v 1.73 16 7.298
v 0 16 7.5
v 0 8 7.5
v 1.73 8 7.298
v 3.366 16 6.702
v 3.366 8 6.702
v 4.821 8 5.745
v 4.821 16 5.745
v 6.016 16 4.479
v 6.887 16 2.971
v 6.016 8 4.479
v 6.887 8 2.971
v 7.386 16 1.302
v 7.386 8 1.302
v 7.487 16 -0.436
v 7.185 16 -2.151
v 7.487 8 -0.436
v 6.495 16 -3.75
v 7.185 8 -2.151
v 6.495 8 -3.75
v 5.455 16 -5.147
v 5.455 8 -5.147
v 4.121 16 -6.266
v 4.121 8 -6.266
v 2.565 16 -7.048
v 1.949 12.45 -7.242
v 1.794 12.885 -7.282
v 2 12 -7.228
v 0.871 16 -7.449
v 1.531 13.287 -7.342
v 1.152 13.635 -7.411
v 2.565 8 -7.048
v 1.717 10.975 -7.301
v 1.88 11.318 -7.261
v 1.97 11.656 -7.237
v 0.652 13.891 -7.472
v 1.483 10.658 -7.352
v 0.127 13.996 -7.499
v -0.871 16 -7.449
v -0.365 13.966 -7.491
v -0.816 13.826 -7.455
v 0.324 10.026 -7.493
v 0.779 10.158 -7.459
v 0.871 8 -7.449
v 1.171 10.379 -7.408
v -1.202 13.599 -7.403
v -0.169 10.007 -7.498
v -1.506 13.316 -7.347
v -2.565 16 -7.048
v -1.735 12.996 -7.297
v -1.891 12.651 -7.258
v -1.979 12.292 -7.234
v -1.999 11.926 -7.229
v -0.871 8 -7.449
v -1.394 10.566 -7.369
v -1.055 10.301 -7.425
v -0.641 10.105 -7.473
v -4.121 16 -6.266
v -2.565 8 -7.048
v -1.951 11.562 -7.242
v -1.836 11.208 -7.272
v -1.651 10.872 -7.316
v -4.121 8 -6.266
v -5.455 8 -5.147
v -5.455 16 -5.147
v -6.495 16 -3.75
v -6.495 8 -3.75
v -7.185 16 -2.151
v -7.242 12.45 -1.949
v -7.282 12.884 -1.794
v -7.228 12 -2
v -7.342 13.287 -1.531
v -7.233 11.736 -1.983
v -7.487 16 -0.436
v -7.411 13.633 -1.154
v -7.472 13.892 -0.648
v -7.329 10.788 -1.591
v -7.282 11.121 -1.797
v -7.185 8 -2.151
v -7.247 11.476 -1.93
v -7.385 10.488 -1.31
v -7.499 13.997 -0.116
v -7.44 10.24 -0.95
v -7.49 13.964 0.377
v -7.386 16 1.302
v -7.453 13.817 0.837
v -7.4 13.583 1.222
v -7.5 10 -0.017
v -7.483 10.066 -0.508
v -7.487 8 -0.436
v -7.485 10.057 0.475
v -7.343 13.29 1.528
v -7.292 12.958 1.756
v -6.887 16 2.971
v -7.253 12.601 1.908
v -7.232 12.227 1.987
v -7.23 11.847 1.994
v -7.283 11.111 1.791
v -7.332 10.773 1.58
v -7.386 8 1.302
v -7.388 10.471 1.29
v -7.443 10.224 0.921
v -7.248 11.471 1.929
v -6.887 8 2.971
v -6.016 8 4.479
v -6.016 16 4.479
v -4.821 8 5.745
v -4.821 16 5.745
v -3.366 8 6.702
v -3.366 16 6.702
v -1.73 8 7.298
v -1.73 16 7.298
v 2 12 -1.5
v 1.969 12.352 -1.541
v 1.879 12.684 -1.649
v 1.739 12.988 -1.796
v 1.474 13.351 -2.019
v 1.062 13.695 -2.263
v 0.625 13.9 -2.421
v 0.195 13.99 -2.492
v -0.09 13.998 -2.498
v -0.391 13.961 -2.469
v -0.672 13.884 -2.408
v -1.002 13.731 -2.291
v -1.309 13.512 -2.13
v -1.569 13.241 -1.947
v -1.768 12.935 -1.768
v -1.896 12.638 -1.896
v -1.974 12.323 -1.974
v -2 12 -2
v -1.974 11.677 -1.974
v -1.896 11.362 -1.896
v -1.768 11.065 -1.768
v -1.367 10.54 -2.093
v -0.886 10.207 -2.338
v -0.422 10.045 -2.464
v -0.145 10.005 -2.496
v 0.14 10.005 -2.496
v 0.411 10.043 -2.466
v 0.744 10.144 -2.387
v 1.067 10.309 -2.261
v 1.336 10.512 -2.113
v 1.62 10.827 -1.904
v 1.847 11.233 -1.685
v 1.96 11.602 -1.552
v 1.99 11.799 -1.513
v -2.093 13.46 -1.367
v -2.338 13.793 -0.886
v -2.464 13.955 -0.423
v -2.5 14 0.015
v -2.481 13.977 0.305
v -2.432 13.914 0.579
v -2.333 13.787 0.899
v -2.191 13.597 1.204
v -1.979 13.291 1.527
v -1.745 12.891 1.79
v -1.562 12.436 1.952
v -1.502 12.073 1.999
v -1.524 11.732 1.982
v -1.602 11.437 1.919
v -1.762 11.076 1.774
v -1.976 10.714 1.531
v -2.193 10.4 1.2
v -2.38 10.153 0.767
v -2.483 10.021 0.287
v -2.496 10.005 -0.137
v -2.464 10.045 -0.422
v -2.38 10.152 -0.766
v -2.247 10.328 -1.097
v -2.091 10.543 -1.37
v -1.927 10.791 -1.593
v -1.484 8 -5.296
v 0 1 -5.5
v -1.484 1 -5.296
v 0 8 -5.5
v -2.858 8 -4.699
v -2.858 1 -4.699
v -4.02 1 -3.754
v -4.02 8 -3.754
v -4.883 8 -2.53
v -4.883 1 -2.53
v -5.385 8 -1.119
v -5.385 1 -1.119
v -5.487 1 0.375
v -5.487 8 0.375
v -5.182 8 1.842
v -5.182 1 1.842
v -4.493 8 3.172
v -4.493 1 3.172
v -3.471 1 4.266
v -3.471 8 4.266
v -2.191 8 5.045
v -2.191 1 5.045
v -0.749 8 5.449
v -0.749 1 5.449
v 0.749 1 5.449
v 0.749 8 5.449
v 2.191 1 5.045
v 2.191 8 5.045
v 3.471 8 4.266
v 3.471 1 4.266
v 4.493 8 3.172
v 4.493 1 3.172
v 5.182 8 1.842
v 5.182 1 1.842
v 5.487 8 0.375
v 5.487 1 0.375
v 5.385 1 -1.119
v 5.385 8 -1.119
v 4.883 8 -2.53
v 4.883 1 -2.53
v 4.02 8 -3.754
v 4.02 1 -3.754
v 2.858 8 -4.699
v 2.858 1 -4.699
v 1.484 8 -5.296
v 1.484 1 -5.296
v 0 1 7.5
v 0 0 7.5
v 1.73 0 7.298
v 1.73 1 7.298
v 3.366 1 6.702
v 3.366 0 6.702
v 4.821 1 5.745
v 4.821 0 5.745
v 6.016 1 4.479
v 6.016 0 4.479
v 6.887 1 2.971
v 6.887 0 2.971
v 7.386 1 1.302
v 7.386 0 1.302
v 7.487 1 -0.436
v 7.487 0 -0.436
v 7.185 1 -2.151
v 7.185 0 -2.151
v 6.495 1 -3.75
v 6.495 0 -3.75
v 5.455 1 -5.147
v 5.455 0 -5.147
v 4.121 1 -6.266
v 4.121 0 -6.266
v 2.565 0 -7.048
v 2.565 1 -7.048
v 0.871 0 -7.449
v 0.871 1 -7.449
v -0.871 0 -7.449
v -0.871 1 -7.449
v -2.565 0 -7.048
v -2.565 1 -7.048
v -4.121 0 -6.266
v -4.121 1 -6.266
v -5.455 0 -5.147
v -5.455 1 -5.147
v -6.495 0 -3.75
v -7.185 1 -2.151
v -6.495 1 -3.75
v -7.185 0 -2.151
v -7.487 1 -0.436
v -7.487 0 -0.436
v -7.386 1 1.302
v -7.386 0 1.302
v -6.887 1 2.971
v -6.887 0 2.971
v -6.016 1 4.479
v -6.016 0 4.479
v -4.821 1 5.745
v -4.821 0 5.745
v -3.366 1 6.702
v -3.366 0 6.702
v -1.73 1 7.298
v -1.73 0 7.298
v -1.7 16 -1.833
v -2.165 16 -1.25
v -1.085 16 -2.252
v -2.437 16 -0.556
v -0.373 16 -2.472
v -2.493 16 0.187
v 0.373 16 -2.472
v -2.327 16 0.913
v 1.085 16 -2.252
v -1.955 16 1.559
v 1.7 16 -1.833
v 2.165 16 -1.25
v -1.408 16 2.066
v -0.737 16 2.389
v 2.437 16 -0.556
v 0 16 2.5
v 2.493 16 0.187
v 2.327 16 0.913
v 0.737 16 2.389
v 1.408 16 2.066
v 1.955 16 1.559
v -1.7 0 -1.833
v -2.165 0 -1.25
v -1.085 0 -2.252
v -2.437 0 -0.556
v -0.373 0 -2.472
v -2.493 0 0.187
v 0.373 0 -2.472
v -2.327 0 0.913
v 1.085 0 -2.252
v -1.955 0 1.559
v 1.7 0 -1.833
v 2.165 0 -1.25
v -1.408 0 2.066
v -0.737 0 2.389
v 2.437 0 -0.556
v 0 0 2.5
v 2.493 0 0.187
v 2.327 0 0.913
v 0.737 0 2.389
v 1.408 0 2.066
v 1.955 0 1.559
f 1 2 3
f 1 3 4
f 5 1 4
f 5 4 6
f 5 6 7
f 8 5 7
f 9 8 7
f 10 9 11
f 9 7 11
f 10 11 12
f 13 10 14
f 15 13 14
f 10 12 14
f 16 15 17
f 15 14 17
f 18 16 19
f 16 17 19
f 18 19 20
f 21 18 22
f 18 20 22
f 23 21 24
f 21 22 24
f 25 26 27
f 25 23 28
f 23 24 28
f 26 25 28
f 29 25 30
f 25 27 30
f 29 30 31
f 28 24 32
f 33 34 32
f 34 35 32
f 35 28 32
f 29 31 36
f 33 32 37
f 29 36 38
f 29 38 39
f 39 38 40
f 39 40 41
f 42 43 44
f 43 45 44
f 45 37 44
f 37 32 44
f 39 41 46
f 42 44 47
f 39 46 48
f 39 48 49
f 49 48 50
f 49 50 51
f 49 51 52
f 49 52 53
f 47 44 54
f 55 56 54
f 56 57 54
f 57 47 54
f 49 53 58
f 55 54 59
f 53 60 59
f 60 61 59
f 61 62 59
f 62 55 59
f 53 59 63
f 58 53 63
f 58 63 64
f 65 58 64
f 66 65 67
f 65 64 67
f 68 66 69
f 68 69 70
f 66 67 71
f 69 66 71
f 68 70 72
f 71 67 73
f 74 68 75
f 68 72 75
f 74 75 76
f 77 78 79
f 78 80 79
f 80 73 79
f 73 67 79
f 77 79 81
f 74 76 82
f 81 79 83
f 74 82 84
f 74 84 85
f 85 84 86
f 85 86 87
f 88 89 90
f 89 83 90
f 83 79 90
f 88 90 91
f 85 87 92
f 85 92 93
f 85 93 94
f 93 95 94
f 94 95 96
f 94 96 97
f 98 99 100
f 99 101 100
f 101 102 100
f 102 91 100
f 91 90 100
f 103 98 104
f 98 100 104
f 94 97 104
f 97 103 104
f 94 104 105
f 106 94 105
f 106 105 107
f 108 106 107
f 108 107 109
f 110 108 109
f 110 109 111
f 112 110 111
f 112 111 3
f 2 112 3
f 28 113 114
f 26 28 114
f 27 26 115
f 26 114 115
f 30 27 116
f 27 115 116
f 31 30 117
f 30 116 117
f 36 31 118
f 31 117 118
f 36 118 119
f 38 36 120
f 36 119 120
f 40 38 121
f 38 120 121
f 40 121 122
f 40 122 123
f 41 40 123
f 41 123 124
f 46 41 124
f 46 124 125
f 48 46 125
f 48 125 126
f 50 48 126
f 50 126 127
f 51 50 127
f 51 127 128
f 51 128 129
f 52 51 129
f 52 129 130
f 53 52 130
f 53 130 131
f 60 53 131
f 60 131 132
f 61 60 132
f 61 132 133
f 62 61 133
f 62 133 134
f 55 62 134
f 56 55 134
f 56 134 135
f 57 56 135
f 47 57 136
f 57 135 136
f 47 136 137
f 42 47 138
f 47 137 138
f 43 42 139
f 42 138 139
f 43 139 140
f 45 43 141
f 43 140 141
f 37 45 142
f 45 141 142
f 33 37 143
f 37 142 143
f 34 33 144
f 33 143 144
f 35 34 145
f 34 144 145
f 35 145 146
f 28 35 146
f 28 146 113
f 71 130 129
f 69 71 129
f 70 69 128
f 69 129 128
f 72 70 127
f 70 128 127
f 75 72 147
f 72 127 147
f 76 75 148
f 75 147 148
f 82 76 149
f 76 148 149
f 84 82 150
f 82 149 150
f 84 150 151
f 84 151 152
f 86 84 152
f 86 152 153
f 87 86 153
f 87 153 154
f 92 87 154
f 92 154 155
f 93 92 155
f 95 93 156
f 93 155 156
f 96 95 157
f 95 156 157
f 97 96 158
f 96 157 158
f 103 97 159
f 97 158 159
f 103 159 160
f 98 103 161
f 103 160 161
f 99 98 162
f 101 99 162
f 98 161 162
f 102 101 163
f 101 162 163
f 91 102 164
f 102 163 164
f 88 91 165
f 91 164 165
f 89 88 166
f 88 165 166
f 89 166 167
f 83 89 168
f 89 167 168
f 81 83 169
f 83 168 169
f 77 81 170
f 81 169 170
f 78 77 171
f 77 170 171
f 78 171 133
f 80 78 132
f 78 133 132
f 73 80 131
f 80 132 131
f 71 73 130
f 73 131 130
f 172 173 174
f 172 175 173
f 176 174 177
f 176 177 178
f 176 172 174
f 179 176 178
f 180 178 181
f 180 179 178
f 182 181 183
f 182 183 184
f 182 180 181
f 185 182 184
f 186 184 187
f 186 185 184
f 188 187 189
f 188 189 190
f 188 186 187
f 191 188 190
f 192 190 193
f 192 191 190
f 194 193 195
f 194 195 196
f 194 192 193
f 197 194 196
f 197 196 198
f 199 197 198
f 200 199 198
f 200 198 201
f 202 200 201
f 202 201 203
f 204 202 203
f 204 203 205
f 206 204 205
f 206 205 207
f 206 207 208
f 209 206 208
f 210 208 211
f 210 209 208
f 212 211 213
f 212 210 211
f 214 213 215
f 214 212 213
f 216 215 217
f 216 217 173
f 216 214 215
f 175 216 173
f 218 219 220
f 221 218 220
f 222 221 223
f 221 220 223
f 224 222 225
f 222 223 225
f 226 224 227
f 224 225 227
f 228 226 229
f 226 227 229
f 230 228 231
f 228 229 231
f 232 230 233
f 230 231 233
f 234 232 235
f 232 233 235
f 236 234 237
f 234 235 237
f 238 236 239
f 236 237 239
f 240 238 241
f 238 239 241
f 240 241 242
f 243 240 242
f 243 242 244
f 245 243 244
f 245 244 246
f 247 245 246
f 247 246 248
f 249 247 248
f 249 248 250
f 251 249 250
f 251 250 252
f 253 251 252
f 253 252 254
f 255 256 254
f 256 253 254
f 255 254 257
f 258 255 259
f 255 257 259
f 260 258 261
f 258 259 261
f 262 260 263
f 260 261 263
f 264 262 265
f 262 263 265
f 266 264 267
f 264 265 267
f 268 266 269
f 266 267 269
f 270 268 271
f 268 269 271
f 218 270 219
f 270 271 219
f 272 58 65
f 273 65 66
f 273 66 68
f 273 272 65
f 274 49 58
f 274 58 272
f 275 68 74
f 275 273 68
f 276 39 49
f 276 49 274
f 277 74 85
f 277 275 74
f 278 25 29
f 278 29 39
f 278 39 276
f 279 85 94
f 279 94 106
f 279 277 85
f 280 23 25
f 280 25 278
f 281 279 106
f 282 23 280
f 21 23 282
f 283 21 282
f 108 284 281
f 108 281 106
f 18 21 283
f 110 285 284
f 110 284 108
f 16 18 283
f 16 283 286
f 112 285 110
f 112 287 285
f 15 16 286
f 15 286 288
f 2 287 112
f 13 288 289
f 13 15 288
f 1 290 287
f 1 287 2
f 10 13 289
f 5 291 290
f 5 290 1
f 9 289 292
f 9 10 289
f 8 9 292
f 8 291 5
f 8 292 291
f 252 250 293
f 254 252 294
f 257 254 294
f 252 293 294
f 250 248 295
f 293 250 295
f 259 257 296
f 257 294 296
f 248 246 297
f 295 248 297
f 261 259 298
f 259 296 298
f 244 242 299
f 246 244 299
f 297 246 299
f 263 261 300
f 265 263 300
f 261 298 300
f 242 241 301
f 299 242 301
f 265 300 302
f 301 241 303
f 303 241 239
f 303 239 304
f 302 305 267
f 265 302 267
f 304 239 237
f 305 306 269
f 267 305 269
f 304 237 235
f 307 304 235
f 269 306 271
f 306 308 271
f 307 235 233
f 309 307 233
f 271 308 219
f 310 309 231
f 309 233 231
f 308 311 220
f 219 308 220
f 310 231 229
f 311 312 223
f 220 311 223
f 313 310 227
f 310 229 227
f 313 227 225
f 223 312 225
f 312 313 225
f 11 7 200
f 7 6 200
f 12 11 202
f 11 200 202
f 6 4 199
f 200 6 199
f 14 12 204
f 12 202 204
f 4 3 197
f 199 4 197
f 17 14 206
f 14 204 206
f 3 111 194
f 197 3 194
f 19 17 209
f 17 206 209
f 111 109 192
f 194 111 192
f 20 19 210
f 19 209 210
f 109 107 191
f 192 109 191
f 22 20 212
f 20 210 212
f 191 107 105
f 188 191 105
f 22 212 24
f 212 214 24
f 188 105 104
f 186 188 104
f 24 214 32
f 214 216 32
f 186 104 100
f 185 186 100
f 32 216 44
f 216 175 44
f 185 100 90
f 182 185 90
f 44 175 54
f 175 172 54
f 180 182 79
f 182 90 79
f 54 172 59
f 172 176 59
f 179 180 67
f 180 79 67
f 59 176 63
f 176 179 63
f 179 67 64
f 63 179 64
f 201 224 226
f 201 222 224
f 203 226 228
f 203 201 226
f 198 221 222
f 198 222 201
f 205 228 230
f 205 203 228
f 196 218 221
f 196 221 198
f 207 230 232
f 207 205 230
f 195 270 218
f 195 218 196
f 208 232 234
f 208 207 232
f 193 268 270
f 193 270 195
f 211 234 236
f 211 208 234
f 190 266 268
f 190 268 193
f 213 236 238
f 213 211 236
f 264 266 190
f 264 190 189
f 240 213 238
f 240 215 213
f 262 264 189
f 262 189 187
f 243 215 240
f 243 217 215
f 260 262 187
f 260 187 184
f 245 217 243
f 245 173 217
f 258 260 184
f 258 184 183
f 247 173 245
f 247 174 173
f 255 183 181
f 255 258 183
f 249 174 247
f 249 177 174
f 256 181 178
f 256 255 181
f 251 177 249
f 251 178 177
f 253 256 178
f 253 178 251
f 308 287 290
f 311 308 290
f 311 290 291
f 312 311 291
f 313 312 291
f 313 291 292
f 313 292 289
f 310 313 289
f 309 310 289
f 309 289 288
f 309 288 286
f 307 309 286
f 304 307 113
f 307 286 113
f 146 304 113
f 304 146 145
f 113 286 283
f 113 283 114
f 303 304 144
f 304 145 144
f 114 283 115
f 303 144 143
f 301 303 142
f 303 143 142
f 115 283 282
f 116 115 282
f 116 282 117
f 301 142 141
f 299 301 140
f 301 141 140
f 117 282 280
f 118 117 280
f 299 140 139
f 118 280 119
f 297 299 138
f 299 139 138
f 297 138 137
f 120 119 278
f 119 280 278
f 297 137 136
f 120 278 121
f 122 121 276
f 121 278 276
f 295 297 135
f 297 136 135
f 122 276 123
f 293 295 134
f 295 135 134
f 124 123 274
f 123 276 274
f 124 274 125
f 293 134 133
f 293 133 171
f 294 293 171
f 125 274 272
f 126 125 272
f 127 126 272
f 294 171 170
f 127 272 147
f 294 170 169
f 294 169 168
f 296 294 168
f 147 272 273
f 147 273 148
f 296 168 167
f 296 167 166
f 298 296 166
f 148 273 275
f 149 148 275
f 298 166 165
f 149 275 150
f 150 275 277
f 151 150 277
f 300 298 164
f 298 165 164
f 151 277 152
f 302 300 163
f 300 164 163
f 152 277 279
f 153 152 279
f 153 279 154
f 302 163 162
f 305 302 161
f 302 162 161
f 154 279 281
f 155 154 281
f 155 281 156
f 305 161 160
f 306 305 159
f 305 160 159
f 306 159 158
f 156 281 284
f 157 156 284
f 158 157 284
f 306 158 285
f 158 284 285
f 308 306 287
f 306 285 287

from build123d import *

# Parameters (mm, degrees)
ESQUISSE1_R                  = 7.5
BOSS_EXTRU_1_DEPTH           = 16
ESQUISSE2_W                  = 2
ESQUISSE2_H                  = 7
ESQUISSE3_R                  = 2.5
ENL_V_MAT_EXTRU_1_DEPTH      = 16
ESQUISSE4_R                  = 2
ENL_V_MAT_EXTRU_2_DEPTH      = 20.19635382
R_P_TITION_CIRCULAIRE1_COUNT = 2
R_P_TITION_CIRCULAIRE1_ANGLE = 90


with BuildPart() as part:
    # Esquisse1 → Boss.-Extru.1 (new body)
    with BuildSketch(Plane(origin=(0, 0, 0), x_dir=(1, 0, 0), z_dir=(0, 1, 0))):
        with Locations(Location((0, 0, 0), (0, 0, 270))):
            Circle(ESQUISSE1_R)
    extrude(amount=BOSS_EXTRU_1_DEPTH)

    # Esquisse2 → Enlèvement de matière-Révolution1 (revolve, cut)
    with BuildSketch(Plane(origin=(0, 0, 0), x_dir=(0, 0, -1), z_dir=(1, 0, 0)), mode=Mode.PRIVATE) as enl_vement_de_mati_re_r_volution1_sk:
        with Locations((-6.5, 4.5)):
            Rectangle(ESQUISSE2_W, ESQUISSE2_H)
    revolve(enl_vement_de_mati_re_r_volution1_sk.sketch.rotate(Axis((0, 0, 0), (0, 1, 0)), 180), axis=Axis((0, 0, 0), (0, 1, 0)), mode=Mode.SUBTRACT)

    # Esquisse3 → Enlèv. mat.-Extru.1 (cut)
    with BuildSketch(Plane(origin=(0, 16, 0), x_dir=(1, 0, 0), z_dir=(0, 1, 0))):
        with Locations(Location((0, 0, 0), (0, 0, 270))):
            Circle(ESQUISSE3_R)
    extrude(amount=-ENL_V_MAT_EXTRU_1_DEPTH, mode=Mode.SUBTRACT)

    # Esquisse4 → Enlèv. mat.-Extru.2 (cut, through all)
    with BuildSketch(Plane.XY):
        with Locations((0, 12)):
            Circle(ESQUISSE4_R)
    enl_v_mat_extru_2 = extrude(amount=-ENL_V_MAT_EXTRU_2_DEPTH, mode=Mode.SUBTRACT)

    # Répétition circulaire1: Enlèv. mat.-Extru.2 ×2 about axis
    r_p_tition_circulaire1_axis = Axis((0, 16, 0), (0, 1, 0))
    for i in range(1, R_P_TITION_CIRCULAIRE1_COUNT):
        add(enl_v_mat_extru_2.rotate(r_p_tition_circulaire1_axis, i * R_P_TITION_CIRCULAIRE1_ANGLE / (R_P_TITION_CIRCULAIRE1_COUNT - 1)), mode=Mode.SUBTRACT)


solid = part.part
